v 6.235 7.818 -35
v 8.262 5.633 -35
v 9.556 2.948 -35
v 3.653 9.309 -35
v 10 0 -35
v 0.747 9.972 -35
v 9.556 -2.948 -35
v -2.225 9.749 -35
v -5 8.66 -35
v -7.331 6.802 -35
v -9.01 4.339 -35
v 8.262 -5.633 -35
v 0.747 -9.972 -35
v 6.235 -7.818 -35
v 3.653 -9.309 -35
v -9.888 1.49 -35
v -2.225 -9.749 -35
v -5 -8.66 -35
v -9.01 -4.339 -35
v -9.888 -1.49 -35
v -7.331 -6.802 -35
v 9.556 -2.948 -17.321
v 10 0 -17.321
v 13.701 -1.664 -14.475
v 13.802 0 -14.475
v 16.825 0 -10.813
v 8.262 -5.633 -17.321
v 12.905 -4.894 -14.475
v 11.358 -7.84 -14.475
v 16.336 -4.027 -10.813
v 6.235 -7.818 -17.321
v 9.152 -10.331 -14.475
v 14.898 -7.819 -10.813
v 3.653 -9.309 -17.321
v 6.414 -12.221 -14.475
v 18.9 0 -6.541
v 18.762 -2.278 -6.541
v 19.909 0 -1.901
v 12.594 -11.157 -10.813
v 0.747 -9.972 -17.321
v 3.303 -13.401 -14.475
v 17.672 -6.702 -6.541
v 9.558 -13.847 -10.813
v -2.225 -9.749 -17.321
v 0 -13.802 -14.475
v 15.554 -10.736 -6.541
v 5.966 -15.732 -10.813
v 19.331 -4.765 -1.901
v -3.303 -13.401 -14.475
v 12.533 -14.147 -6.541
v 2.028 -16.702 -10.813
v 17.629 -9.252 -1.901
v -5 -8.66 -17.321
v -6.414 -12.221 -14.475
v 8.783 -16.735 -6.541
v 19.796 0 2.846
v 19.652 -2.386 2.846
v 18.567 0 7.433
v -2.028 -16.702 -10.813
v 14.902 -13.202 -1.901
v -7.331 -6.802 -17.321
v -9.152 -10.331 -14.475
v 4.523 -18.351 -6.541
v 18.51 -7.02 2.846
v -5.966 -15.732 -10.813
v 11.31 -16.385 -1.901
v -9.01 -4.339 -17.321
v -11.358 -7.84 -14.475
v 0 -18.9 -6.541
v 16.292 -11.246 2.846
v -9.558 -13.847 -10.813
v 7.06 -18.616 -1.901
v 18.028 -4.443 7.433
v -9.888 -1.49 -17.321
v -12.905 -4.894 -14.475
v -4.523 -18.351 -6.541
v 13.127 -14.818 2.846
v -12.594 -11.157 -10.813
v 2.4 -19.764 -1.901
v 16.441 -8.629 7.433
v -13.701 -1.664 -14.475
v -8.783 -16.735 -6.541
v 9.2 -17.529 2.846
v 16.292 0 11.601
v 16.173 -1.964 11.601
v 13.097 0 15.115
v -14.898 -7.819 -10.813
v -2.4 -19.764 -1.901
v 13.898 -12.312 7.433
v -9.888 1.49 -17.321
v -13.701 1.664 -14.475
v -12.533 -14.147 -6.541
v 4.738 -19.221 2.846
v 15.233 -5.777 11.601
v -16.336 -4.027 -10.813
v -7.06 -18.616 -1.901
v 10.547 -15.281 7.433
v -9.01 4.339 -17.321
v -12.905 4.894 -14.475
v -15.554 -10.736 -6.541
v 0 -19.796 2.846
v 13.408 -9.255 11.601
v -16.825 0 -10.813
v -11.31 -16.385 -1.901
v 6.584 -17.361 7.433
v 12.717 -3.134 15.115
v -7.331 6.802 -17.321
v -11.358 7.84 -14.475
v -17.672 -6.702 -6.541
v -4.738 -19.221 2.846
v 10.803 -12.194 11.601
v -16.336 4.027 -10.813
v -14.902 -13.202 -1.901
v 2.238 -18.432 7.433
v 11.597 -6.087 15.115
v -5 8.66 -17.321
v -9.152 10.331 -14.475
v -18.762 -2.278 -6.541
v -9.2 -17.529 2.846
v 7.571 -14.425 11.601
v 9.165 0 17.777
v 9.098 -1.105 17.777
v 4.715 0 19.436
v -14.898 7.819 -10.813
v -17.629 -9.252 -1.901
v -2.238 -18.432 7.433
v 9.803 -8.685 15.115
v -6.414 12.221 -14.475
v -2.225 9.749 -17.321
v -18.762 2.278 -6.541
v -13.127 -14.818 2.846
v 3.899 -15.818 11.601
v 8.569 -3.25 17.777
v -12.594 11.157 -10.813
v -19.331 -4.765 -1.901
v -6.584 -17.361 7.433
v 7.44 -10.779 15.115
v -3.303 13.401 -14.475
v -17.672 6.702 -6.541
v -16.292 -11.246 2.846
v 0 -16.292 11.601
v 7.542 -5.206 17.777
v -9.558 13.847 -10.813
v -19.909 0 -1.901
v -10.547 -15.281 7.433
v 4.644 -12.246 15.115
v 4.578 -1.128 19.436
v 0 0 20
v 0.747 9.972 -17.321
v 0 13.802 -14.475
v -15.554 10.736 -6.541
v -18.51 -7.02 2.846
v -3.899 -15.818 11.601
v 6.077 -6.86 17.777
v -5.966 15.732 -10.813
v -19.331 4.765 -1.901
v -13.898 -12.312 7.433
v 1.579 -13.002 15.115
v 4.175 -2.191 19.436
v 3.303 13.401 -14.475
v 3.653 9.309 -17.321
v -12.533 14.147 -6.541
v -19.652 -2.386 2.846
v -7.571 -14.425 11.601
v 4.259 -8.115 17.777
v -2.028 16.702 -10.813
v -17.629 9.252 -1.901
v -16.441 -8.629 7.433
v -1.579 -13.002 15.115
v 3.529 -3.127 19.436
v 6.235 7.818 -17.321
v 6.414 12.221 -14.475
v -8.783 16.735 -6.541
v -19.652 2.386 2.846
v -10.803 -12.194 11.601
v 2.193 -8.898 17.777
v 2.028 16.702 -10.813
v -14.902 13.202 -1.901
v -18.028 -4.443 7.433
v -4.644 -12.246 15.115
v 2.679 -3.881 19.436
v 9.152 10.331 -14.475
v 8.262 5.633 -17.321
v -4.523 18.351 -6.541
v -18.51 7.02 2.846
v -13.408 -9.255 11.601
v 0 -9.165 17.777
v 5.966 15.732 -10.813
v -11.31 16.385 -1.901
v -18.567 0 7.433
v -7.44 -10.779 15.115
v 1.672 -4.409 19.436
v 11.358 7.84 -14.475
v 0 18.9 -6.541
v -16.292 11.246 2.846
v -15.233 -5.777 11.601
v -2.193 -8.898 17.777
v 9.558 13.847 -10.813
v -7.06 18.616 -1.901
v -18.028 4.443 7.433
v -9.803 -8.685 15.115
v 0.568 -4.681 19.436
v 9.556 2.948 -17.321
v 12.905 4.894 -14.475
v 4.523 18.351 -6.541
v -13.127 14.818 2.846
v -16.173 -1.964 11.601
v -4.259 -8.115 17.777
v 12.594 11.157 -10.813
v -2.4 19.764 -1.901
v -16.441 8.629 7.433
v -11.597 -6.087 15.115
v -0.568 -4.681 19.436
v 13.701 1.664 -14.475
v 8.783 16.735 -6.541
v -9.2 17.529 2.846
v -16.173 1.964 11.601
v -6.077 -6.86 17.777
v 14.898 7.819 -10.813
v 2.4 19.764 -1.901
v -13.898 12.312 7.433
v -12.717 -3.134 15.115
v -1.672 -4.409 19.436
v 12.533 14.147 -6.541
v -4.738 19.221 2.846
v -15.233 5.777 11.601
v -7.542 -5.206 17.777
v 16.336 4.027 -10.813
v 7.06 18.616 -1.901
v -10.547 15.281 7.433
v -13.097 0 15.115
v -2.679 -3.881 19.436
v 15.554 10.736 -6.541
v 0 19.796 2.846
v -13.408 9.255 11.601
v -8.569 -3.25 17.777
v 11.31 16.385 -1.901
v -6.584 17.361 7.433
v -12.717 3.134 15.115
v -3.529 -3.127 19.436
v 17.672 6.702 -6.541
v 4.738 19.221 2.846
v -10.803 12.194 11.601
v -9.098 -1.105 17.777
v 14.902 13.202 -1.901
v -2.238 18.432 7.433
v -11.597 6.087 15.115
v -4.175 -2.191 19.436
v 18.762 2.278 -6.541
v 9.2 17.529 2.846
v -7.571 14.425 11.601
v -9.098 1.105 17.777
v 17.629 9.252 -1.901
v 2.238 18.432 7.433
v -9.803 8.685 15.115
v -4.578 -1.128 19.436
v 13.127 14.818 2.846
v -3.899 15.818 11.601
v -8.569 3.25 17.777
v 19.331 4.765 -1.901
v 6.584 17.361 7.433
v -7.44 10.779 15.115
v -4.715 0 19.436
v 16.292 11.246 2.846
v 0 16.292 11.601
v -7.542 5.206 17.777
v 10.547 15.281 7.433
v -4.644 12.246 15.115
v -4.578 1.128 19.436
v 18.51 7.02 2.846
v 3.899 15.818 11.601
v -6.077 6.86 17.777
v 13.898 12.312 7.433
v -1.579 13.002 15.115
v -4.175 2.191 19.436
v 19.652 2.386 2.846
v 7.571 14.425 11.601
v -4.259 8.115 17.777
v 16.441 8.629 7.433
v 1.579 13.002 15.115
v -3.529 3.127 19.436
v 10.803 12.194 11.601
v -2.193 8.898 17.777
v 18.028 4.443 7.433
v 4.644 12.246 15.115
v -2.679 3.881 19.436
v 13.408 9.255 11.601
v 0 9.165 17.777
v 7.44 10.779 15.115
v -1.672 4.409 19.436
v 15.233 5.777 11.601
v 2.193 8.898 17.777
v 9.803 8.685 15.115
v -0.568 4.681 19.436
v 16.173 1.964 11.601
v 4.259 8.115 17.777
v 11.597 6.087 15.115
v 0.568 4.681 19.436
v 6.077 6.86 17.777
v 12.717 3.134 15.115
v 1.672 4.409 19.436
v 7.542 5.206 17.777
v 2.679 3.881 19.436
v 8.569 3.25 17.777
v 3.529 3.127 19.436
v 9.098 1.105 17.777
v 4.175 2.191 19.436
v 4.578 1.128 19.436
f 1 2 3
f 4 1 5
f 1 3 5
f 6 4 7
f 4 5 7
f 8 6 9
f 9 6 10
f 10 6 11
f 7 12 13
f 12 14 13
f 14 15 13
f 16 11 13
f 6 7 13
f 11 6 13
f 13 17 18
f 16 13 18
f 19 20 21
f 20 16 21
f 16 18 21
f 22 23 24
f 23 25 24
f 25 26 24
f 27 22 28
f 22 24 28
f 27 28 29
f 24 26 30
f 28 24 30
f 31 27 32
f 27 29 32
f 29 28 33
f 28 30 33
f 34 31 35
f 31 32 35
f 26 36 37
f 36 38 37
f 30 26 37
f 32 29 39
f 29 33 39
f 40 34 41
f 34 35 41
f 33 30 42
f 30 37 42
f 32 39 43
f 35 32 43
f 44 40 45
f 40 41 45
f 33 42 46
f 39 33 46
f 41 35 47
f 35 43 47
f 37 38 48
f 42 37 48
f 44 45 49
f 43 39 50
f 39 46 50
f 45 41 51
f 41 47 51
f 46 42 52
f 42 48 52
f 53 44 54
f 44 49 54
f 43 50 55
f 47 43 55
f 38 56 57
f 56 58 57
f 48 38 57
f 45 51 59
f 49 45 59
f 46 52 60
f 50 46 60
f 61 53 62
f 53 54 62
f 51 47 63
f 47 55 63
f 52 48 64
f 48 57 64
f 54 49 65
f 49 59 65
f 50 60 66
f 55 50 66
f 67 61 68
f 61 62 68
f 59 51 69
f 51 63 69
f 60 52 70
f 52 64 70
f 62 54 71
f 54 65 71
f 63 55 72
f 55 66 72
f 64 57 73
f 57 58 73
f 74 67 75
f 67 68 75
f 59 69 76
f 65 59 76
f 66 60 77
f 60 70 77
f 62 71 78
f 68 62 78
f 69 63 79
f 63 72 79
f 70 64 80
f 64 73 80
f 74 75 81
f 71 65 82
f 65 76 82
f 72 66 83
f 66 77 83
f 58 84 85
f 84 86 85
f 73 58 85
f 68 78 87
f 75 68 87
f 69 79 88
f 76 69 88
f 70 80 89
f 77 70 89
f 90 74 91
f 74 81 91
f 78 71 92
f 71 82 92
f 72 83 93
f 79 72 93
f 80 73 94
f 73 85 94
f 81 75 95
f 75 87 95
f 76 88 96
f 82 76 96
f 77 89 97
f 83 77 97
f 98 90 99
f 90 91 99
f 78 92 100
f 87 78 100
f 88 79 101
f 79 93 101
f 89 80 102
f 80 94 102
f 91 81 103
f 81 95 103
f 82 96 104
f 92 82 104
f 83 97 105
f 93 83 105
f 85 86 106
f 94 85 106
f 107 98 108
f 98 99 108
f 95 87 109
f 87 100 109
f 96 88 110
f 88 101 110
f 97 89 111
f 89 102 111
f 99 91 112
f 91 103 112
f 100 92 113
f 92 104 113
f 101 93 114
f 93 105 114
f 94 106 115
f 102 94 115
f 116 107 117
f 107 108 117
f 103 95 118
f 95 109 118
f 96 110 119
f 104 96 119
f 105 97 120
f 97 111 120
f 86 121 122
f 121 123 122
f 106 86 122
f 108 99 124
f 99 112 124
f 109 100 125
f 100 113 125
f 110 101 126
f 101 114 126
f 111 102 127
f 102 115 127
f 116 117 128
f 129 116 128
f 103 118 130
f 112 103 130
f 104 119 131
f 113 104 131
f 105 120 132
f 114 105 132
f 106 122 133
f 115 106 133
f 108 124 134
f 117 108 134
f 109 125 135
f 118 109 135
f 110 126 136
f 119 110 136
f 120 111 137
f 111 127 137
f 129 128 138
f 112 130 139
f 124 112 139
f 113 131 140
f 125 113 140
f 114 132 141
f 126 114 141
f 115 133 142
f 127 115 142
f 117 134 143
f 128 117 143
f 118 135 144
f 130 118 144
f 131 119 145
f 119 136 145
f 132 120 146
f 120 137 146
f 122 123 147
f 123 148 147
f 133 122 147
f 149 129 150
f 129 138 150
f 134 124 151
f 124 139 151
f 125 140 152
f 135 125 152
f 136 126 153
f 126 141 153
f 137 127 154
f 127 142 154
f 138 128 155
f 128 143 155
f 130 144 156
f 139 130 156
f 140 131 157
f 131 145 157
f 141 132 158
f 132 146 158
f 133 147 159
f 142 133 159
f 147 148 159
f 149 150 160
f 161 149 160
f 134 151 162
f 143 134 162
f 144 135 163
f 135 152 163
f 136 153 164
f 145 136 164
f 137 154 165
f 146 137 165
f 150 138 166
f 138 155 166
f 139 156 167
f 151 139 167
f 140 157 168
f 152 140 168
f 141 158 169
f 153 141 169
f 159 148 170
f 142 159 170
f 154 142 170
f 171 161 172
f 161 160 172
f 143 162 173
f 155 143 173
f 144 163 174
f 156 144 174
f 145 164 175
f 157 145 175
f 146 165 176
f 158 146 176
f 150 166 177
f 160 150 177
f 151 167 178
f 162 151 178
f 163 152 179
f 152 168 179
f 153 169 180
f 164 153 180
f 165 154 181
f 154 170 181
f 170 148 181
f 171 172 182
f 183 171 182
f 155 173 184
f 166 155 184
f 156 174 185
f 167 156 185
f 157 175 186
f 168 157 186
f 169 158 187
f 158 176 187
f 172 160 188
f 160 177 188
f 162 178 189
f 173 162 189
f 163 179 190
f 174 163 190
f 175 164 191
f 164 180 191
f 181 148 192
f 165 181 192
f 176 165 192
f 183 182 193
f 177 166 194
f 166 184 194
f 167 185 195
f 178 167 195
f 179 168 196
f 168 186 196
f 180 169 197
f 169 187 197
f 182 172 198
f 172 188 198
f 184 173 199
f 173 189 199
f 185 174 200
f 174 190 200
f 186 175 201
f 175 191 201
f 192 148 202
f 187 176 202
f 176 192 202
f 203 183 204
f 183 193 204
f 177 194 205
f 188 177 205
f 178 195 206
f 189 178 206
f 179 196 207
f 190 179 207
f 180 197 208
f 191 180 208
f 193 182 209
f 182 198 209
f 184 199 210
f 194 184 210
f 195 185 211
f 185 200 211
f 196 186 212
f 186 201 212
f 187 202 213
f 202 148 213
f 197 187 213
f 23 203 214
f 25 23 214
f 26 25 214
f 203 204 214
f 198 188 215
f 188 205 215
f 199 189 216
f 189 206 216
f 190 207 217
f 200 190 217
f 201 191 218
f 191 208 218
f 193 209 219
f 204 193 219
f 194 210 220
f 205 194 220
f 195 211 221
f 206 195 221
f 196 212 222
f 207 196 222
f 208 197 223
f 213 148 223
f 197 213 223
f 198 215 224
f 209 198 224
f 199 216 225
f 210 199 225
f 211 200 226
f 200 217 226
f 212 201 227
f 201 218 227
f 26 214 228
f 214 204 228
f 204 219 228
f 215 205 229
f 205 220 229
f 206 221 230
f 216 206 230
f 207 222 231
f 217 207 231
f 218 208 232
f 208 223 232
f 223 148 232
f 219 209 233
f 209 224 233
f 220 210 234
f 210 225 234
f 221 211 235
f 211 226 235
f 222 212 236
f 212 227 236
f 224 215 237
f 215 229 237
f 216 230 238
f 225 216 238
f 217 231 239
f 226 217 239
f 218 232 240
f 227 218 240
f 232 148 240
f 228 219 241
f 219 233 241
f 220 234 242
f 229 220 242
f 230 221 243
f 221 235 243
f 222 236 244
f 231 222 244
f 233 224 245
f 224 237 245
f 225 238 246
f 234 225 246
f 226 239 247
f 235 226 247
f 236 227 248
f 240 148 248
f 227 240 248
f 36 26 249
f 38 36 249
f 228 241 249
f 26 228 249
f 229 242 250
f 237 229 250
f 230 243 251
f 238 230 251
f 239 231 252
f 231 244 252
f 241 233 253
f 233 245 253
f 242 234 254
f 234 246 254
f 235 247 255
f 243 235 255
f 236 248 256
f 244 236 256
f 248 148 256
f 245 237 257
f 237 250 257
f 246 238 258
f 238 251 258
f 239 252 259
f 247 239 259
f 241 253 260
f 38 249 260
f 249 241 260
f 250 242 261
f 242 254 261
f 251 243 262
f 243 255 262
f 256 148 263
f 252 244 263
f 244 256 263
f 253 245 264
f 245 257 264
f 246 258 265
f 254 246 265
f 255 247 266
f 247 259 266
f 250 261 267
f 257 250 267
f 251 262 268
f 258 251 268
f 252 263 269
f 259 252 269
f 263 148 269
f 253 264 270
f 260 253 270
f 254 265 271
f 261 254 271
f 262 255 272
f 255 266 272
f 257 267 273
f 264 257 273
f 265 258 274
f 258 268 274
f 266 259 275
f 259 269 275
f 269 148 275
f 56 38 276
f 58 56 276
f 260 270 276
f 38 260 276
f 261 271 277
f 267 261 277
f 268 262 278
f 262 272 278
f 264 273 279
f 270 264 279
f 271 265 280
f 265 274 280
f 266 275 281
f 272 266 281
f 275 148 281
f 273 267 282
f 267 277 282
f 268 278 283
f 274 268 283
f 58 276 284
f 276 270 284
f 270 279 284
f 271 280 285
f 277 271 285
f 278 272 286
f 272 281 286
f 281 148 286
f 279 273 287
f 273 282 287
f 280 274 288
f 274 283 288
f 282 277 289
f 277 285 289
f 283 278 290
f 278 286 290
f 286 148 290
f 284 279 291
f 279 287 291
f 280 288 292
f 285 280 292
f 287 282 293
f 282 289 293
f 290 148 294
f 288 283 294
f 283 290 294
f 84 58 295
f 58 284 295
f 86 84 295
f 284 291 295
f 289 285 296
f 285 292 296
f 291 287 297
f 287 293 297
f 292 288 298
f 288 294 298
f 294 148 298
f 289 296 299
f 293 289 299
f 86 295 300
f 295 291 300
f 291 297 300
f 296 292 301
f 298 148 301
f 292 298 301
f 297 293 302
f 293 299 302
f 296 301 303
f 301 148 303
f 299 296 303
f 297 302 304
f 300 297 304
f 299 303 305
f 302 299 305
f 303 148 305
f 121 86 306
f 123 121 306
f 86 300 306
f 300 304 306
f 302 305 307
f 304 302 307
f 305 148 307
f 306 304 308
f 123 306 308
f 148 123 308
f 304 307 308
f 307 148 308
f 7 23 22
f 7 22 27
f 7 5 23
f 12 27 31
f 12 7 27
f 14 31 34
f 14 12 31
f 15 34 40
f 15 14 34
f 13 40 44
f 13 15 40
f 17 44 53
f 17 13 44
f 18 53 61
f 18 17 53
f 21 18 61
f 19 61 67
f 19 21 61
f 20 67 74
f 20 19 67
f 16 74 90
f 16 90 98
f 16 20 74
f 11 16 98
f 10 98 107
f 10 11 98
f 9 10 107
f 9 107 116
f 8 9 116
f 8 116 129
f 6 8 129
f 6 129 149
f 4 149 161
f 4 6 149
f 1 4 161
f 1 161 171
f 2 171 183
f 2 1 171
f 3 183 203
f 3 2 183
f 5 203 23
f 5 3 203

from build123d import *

# Parameters (mm, degrees)
F0_W     = 10
F0_H     = 15
F2_DEPTH = 25.4


with BuildPart() as f1:
    # F0 (on Front) → F1 (revolve)
    with BuildSketch(Plane.XZ):
        with BuildLine():
            Line((0, 20), (0, -20))
            ThreePointArc((0, -20), (20, 0), (0, 20))
        make_face()
    revolve(axis=Axis((0, 0, 0), (0, 0, -1)))



with BuildPart() as f1b:
    # F0 (on Front) → F1, piece 2 (revolve)
    with BuildSketch(Plane.XZ):
        with Locations((5, -27.5)):
            Rectangle(F0_W, F0_H)
    revolve(axis=Axis((0, 0, 0), (0, 0, -1)))


with BuildPart() as f1_1:
    add(f1.part)
    # F2 (add): a face of the model
    f2_faces = [f1b.part.faces().sort_by_distance(p)[0] for p in [
        (0, 0, -20),
    ]]

    add(f1b.part)  # F2 merges F1b
    extrude(f2_faces, amount=F2_DEPTH)


solid = f1_1.part
